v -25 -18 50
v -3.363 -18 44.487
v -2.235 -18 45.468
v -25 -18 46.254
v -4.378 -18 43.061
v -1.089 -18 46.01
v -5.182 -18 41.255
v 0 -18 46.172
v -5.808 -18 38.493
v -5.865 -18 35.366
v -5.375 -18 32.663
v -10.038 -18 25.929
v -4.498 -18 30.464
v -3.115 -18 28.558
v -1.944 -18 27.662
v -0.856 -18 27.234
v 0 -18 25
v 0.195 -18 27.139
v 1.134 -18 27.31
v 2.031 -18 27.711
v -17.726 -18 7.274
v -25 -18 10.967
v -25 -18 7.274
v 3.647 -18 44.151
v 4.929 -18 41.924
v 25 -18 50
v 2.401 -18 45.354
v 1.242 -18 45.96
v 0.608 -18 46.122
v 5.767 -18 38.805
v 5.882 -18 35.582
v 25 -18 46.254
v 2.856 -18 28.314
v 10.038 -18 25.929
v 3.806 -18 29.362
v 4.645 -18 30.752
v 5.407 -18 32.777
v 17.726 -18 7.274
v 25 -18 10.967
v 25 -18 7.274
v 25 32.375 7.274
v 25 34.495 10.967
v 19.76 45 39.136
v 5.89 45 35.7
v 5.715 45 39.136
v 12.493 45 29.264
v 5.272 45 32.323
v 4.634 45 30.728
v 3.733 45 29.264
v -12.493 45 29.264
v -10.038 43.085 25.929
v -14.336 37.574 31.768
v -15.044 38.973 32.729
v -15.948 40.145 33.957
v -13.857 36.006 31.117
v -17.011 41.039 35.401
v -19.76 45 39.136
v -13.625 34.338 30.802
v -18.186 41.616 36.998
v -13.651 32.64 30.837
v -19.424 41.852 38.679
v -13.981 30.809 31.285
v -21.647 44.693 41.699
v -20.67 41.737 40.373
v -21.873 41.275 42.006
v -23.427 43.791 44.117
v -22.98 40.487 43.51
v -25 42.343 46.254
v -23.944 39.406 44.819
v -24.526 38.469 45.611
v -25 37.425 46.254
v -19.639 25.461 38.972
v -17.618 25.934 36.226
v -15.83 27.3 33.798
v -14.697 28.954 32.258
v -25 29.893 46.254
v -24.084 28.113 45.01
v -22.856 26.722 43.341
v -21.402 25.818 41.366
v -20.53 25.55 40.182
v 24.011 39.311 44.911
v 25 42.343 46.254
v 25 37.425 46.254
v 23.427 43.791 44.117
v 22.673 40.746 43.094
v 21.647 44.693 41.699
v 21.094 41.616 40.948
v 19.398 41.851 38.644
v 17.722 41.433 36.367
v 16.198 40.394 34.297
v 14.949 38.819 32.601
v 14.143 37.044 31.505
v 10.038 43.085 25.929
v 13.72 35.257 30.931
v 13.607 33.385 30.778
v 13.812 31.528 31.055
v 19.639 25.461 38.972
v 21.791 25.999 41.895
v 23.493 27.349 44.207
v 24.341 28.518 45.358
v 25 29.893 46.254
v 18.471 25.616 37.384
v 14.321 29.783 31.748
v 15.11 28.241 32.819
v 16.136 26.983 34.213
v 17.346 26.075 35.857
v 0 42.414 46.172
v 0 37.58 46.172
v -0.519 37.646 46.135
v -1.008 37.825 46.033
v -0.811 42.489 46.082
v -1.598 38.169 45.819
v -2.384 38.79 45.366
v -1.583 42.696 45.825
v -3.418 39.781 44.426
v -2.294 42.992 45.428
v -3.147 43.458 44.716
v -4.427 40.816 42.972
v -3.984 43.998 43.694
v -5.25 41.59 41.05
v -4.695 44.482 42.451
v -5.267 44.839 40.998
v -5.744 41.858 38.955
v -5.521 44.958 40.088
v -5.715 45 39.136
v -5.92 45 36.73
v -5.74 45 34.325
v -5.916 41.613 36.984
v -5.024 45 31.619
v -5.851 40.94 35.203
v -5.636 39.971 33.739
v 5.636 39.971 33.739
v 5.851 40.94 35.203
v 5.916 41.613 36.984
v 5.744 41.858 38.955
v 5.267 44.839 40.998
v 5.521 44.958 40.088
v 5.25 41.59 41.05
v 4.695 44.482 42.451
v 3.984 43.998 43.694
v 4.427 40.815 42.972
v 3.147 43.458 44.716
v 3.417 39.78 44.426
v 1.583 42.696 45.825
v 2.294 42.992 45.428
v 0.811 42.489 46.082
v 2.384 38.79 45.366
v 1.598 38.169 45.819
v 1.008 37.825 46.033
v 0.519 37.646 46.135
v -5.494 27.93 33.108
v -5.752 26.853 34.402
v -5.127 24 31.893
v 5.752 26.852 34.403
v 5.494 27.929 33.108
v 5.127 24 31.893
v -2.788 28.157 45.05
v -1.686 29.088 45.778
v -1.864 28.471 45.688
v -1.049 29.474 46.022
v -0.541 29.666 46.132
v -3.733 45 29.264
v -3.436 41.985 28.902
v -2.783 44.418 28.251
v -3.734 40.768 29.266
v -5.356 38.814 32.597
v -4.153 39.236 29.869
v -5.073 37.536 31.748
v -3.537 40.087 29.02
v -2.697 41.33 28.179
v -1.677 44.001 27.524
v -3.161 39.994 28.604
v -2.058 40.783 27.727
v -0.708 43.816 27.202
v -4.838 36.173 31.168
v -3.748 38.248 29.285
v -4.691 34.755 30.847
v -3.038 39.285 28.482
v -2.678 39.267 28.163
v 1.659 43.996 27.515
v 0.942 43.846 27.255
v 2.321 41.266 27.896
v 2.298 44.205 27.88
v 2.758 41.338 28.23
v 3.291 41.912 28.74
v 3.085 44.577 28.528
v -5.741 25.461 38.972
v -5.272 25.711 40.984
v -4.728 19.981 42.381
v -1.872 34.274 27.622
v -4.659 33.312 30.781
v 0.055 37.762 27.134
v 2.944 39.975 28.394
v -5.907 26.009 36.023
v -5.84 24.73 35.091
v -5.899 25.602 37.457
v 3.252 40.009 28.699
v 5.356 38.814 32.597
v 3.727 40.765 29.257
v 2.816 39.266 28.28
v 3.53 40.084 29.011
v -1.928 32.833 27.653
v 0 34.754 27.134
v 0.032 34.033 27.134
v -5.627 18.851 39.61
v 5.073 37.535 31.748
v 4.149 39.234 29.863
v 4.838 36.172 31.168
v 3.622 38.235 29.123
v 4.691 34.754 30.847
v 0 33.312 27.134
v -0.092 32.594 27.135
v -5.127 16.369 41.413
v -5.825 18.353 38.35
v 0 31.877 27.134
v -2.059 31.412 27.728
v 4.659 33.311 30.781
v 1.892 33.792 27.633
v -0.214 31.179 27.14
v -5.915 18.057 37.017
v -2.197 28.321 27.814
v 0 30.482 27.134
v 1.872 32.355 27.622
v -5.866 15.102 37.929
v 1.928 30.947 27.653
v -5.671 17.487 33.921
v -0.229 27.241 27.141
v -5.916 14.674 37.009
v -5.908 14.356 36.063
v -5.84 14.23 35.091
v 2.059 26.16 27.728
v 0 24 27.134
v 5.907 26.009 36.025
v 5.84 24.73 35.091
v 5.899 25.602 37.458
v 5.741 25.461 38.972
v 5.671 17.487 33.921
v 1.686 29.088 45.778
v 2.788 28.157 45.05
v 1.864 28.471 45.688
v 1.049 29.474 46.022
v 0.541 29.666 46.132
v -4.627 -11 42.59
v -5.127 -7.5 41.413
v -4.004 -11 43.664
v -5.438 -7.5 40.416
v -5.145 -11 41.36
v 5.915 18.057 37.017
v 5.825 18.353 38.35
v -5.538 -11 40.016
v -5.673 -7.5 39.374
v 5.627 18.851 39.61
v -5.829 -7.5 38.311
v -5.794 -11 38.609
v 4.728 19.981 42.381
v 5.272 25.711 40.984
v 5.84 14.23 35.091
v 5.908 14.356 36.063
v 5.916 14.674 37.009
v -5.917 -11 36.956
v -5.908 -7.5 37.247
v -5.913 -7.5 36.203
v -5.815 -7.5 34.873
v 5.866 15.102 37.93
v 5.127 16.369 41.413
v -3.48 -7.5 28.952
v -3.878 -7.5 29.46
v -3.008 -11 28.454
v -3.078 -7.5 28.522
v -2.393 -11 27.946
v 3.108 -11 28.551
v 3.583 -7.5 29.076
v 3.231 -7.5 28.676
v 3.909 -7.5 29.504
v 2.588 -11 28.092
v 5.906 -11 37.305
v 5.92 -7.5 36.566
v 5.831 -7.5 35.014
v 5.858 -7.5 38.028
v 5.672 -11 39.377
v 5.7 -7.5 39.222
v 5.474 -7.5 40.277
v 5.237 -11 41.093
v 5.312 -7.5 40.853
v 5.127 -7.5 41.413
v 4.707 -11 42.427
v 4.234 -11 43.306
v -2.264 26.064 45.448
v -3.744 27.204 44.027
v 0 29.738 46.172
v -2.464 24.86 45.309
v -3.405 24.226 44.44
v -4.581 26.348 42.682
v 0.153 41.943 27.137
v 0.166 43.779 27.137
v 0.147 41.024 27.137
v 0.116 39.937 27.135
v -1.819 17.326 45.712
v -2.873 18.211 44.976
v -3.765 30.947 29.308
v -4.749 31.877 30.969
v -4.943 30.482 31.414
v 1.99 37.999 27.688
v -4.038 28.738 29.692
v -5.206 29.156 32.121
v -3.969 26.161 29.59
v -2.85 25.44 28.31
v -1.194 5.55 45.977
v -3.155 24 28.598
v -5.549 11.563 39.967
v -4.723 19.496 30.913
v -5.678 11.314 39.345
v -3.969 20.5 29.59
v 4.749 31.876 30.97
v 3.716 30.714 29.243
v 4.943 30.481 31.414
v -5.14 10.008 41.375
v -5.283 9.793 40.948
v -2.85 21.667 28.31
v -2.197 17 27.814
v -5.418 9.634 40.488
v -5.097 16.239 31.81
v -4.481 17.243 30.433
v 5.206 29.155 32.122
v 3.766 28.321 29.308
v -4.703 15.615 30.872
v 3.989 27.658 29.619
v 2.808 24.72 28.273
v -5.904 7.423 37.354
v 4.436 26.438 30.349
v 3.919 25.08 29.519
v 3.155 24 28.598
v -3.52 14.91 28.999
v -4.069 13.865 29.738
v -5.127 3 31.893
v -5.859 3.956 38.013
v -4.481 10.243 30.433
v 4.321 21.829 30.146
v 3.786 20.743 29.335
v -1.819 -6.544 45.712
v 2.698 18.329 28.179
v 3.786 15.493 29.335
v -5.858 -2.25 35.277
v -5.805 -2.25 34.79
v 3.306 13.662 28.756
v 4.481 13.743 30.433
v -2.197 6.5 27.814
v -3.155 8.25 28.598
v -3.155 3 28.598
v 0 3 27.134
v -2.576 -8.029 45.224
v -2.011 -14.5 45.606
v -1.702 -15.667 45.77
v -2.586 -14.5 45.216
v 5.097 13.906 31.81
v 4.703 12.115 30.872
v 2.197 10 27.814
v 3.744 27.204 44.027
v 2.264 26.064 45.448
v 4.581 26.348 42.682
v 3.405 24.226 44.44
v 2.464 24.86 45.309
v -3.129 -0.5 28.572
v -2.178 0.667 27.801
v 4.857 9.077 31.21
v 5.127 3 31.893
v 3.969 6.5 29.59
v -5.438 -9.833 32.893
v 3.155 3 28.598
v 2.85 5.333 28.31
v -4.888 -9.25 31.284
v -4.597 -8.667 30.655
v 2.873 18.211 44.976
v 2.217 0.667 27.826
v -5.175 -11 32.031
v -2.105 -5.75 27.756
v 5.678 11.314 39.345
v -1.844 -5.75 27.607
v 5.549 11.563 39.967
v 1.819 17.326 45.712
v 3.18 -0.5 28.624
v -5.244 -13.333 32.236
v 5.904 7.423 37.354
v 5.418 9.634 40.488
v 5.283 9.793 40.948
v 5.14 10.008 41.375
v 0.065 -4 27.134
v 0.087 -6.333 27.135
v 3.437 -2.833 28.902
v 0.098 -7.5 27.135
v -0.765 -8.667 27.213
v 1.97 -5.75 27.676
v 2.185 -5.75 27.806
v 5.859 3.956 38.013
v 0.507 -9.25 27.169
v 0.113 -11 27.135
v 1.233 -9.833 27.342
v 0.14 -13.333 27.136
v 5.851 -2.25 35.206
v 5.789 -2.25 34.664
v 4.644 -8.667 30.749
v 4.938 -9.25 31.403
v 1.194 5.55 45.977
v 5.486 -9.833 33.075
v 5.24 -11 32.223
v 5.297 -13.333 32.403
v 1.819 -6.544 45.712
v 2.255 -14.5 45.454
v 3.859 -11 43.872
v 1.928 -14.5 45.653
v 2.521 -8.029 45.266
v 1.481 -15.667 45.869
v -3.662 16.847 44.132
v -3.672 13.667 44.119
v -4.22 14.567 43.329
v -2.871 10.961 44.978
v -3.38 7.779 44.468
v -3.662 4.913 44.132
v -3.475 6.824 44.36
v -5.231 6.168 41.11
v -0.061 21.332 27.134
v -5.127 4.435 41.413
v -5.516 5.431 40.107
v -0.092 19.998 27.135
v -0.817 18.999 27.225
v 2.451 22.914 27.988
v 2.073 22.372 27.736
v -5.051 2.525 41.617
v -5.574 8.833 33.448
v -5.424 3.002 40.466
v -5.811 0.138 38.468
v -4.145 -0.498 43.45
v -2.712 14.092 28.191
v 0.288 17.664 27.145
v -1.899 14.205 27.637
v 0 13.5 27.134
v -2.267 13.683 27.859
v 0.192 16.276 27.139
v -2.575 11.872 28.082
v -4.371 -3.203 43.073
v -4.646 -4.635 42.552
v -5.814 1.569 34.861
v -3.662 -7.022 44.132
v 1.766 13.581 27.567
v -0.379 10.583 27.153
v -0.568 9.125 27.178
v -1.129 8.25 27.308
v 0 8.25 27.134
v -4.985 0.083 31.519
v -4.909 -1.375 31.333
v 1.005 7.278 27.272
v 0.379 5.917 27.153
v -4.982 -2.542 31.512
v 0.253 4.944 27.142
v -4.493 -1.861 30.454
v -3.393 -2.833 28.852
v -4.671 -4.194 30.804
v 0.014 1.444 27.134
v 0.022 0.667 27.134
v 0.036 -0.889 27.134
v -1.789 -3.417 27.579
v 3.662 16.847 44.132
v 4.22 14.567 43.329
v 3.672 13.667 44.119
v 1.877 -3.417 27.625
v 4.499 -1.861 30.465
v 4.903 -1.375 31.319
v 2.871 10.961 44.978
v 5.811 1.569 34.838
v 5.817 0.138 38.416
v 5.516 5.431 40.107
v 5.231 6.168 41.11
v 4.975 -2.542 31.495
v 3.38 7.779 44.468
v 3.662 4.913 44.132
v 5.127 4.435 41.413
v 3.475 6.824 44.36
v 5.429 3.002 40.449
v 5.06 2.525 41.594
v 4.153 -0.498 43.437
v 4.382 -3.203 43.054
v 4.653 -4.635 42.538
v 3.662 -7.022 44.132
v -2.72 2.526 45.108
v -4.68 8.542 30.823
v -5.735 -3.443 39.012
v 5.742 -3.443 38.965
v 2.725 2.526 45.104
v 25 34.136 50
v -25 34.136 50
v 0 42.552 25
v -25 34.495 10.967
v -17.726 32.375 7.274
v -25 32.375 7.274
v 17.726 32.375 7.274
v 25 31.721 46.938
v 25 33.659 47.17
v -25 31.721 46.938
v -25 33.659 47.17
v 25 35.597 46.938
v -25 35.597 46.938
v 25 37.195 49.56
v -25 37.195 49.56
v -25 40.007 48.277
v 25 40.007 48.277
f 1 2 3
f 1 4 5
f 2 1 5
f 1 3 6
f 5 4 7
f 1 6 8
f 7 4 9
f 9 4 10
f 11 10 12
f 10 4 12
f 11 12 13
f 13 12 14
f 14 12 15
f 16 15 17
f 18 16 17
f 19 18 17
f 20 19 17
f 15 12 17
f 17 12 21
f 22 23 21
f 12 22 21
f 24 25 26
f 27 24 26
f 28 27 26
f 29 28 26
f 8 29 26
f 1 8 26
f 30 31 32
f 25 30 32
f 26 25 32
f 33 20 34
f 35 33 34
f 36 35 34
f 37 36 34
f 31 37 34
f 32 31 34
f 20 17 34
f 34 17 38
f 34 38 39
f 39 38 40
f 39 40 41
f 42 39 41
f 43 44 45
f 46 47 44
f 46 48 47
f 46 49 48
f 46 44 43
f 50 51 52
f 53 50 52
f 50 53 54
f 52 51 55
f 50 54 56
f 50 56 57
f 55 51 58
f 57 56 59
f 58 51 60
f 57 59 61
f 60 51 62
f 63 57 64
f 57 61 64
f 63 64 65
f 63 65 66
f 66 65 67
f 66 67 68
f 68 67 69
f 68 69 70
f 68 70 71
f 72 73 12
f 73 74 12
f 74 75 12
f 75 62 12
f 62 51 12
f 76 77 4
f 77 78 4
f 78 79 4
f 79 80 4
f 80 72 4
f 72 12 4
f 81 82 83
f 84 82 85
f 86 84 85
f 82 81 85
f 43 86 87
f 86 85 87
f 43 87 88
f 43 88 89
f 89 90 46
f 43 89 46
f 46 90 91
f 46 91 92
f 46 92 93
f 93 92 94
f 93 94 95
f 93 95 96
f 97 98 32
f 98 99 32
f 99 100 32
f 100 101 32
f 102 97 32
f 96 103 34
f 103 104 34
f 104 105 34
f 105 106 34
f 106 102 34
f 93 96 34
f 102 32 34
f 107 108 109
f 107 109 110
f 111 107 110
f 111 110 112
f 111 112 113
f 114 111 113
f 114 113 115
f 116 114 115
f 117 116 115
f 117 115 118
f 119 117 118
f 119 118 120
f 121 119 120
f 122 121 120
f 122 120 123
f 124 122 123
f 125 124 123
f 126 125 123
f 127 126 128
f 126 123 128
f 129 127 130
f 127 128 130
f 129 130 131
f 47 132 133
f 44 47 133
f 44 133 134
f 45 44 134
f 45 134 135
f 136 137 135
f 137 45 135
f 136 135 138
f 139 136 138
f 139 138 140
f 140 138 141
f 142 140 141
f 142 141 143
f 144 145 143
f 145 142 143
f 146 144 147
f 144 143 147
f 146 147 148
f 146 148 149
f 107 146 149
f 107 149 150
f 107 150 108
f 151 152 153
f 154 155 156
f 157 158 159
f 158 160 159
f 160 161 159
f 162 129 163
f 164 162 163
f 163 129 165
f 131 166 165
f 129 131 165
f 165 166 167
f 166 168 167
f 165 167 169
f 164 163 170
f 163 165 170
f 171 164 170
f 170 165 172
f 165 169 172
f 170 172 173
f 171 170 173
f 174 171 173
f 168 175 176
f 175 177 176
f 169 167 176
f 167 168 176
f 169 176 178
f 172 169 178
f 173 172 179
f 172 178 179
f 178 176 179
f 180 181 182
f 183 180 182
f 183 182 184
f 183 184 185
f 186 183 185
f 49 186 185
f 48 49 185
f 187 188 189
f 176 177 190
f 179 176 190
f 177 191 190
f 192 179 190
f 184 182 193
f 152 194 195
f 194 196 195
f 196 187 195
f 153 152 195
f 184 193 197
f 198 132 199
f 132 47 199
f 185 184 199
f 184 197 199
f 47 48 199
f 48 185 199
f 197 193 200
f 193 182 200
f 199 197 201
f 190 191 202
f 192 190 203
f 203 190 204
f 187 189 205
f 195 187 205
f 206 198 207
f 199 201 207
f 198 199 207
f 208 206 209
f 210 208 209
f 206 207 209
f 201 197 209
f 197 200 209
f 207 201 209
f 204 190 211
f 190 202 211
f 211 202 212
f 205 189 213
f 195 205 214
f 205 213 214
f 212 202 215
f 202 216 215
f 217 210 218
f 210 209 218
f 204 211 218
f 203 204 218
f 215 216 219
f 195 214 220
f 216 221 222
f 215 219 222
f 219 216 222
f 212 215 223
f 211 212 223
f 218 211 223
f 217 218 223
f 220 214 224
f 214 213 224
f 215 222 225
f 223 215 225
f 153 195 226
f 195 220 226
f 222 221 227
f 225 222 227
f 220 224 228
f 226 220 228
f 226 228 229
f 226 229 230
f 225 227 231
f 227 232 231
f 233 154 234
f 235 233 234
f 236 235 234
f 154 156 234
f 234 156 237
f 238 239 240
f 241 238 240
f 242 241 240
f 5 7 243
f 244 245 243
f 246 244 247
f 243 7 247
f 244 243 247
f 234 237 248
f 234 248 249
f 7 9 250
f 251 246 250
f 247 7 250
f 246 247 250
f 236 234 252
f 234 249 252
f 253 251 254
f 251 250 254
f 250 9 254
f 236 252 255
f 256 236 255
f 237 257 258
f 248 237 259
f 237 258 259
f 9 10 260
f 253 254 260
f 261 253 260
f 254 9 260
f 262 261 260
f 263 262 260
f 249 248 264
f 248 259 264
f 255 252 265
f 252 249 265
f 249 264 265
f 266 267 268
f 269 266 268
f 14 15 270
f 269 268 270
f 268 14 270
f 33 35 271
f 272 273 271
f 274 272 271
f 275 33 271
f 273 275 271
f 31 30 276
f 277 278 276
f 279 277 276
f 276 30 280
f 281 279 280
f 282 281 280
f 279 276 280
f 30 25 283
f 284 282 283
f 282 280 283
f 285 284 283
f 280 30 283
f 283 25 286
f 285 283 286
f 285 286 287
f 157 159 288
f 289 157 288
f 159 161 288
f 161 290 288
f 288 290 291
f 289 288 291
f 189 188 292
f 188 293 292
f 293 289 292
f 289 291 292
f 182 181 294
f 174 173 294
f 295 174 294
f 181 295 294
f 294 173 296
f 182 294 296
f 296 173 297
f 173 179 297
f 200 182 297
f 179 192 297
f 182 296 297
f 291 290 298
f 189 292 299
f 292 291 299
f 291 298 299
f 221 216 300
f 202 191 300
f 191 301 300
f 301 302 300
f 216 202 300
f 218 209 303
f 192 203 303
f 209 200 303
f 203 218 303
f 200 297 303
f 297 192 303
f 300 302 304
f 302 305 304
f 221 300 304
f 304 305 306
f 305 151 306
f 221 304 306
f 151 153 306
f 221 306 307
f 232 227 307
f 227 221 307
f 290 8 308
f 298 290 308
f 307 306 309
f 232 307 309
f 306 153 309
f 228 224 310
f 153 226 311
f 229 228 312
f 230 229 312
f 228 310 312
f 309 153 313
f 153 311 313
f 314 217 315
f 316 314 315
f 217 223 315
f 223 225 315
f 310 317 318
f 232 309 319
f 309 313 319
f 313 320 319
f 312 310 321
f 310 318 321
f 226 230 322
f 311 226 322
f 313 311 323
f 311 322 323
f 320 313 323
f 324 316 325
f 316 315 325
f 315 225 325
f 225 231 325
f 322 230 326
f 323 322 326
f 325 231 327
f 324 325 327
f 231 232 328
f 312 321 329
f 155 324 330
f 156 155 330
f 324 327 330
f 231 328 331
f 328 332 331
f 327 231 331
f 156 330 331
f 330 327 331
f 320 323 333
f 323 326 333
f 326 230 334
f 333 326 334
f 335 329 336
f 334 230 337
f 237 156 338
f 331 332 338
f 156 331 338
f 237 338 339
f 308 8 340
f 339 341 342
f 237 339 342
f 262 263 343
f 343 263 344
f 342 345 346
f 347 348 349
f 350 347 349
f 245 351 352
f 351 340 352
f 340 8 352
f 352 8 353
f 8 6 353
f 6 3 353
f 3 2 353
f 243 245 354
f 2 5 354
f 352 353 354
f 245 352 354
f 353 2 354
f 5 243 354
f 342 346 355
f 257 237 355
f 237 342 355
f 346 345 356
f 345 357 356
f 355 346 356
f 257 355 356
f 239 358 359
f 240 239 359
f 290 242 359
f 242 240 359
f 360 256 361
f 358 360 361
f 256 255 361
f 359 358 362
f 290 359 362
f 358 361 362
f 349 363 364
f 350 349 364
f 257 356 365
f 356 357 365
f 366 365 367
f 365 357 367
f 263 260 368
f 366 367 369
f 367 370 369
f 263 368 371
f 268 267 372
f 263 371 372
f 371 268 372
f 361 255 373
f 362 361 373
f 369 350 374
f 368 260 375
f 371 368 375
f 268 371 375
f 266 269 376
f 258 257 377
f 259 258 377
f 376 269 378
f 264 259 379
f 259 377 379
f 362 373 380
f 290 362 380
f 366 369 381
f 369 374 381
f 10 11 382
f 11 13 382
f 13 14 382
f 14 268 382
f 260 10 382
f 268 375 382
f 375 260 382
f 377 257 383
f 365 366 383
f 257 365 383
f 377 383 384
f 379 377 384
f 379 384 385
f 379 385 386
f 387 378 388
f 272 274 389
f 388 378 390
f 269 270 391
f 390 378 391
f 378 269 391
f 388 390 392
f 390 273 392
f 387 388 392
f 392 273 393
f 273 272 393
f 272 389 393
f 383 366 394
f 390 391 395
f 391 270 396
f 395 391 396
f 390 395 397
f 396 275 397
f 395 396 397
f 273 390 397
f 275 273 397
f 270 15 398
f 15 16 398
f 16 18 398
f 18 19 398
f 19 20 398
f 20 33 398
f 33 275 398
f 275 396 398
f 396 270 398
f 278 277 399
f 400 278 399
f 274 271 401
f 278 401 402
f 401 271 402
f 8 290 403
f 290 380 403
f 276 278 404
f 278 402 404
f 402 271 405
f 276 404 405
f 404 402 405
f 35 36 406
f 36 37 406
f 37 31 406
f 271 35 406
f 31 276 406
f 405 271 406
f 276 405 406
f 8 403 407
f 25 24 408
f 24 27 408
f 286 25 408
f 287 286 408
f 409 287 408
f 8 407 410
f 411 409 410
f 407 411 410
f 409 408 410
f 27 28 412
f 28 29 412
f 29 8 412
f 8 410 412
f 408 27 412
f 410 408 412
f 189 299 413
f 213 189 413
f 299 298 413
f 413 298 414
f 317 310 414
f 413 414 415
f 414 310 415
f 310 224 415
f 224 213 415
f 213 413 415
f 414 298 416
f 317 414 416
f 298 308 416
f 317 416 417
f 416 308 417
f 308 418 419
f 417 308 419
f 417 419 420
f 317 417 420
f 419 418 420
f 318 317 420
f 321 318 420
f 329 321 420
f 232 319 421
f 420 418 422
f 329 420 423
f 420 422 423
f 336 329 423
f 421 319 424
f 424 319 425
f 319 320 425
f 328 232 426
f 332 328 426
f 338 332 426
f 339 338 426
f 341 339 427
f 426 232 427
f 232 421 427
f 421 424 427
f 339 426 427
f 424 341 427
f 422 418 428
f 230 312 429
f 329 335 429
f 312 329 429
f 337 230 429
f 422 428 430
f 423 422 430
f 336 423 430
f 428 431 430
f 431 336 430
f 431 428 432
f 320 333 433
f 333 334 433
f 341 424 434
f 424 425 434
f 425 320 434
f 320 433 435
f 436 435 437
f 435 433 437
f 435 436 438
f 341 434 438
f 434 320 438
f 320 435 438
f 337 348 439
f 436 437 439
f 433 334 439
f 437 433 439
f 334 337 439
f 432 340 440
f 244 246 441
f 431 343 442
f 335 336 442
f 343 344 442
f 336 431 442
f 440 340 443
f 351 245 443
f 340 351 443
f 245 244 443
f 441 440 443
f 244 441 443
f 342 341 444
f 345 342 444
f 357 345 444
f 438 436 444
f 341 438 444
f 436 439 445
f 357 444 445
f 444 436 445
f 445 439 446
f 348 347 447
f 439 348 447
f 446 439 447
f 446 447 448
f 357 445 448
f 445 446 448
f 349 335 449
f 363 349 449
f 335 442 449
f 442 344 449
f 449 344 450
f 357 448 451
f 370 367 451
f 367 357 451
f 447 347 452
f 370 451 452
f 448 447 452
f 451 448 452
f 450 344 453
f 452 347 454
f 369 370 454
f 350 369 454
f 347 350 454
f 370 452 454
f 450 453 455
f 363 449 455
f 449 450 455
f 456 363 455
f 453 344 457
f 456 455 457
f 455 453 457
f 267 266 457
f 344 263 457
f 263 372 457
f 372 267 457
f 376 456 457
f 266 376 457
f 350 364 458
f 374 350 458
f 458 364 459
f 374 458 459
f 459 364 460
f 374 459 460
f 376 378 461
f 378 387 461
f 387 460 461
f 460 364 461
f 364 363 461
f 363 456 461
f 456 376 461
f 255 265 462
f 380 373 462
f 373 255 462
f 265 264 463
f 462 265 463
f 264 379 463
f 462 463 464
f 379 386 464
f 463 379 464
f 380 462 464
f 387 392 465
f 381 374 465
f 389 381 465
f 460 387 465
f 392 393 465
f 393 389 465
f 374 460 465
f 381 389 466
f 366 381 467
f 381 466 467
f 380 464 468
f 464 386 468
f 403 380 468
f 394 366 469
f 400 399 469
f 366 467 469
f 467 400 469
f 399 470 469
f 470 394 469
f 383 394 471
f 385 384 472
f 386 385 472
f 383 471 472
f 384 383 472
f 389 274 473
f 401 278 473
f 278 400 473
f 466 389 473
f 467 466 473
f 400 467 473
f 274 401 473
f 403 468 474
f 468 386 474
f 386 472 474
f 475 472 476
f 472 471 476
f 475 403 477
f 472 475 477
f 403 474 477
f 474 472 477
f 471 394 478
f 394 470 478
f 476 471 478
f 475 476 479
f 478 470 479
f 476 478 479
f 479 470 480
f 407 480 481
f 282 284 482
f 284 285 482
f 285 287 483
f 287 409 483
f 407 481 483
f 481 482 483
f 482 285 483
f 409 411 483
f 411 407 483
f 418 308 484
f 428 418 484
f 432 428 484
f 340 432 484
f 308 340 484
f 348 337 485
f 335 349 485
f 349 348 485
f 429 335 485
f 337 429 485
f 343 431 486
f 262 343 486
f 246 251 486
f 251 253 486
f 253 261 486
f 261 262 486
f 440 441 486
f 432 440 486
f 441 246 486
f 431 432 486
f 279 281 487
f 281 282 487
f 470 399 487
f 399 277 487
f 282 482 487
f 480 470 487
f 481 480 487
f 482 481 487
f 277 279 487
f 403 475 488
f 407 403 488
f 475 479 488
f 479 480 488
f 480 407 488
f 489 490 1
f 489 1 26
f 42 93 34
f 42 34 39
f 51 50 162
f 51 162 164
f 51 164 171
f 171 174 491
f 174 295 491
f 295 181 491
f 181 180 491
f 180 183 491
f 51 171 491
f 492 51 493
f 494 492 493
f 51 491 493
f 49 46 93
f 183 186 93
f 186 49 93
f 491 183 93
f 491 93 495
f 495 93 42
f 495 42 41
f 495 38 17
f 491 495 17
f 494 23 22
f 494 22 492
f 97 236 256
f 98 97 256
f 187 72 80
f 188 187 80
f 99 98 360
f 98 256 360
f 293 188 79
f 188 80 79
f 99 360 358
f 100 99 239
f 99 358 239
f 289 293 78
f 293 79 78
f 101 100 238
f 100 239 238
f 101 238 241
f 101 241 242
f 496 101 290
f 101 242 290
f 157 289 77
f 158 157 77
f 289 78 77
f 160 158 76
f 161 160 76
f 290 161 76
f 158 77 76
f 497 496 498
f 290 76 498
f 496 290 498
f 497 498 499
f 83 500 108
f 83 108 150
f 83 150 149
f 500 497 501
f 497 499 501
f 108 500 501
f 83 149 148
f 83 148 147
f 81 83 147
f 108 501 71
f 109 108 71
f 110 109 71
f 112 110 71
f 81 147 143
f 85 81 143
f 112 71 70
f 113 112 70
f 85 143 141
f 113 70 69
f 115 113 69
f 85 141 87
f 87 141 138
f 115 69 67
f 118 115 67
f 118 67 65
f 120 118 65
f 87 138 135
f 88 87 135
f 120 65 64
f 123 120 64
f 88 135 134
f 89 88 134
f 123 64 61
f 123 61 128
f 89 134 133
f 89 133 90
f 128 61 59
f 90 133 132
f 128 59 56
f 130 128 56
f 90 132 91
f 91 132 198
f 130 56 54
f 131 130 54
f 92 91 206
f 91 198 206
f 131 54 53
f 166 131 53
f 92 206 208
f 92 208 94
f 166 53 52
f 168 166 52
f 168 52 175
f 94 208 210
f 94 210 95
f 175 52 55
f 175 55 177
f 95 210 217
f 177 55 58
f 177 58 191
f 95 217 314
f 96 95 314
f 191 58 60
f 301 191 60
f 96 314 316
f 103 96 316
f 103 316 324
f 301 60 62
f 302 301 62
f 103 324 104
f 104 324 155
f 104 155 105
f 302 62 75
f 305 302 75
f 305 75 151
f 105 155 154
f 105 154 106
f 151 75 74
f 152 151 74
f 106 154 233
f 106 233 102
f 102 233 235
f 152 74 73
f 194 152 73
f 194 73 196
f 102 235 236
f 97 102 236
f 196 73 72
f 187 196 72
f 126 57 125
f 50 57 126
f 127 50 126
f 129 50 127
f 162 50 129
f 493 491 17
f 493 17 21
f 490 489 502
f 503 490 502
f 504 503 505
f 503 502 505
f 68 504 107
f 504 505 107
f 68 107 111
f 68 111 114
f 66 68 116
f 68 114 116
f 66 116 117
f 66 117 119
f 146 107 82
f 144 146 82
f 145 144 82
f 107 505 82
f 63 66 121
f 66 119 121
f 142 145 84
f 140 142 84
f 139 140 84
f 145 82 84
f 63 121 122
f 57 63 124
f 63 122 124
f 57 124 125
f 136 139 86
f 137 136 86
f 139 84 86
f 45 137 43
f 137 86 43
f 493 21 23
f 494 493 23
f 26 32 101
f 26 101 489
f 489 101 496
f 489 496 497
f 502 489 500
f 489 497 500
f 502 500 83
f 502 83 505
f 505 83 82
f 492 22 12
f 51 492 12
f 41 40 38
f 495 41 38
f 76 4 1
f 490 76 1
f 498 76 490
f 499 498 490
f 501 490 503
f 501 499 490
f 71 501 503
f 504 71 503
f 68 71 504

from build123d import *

# Parameters (mm, degrees)
F0_W      = 50
F0_H      = 90
F1_DEPTH  = 50
F3_DEPTH  = 90.001
F4_R      = 8.198492098
F5_DEPTH  = 50.001
F6_R      = 10.8639610307
F8_DEPTH  = 50.001
F11_DEPTH = 90.001
F13_DEPTH = 90.0010001
F14_DEPTH = 90.0010001
F15_DEPTH = 27


with BuildPart() as f1:
    # F0 (on Top) → F1 (new body)
    with BuildSketch(Plane.XY):
        Rectangle(F0_W, F0_H)
    extrude(amount=F1_DEPTH)

    # F2 (on face) → F3 (cut, through all)
    with BuildSketch(Plane.XZ.offset(45)):
        Polygon((0, 25), (-25, 0), (25, 0), align=None)
    extrude(amount=-F3_DEPTH, mode=Mode.SUBTRACT)

    # F4 (on face) → F5 (cut, through all)
    with BuildSketch(Plane(origin=(-25, 0, 0), x_dir=(0, -1, 0), z_dir=(-1, 0, 0))):
        with Locations((-33.659145236, 38.9719307423)):
            Circle(F4_R)
    extrude(amount=-F5_DEPTH, mode=Mode.SUBTRACT)

    # F6
    f6_edges = [f1.edges().sort_by_distance(p)[0] for p in [
        (0, 45, 50),
    ]]
    fillet(f6_edges, radius=F6_R)

    # F7 (on face) → F8 (cut, through all)
    with BuildSketch(Plane.YZ.offset(25)):
        Polygon((28.1980223954, 0), (45, 0), (45, 29.2644444853), align=None)
    extrude(amount=-F8_DEPTH, mode=Mode.SUBTRACT)

    # F10 (on face) → F11 (cut, through all)
    with BuildSketch(Plane.XZ.offset(45)):
        with BuildLine():
            add(Edge.make_bspline(
                [(0, 46.1721457541), (-10.2533935373, 46.1721457541), (-5.1266967687, 31.8932551891), (0, 17.614364624), (5.1266967687, 31.8932551891), (10.2533935373, 46.1721457541), (0, 46.1721457541)],
                knots=[0, 0, 0, 2.0943951024, 2.0943951024, 4.1887902048, 4.1887902048, 6.2831853072, 6.2831853072, 6.2831853072], degree=2, weights=[1, 0.5, 1, 0.5, 1, 0.5, 1]))
        make_face()
    extrude(amount=-F11_DEPTH, mode=Mode.SUBTRACT)

    # F12 (on face) → F13 (cut, through all)
    with BuildSketch(Plane.XZ.offset(45)):
        Polygon((25, 7.2744810022), (17.7255189978, 7.2744810022), (25, 0), align=None)
        Polygon((-17.7255189978, 7.2744810022), (-25, 7.2744810022), (-25, 0), align=None)
    extrude(amount=-F13_DEPTH, mode=Mode.SUBTRACT)

    # F9 (on face) → F14 (cut, through all)
    with BuildSketch(Plane.XZ.offset(45)):
        Polygon((25, 10.9673021361), (25, 46.2542101741), (10.0381237455, 25.9291783907), align=None)
        Polygon((-25, 46.2542101741), (-25, 10.9673021361), (-10.0381237455, 25.9291783907), align=None)
    extrude(amount=-F14_DEPTH, mode=Mode.SUBTRACT)

    # F15 (cut): a face of the model
    f15_faces = [f1.faces().sort_by_distance(p)[0] for p in [
        (21.3627594989, -45, 7.9321640574),
    ]]
    extrude(f15_faces, amount=-F15_DEPTH, mode=Mode.SUBTRACT)


solid = f1.part
